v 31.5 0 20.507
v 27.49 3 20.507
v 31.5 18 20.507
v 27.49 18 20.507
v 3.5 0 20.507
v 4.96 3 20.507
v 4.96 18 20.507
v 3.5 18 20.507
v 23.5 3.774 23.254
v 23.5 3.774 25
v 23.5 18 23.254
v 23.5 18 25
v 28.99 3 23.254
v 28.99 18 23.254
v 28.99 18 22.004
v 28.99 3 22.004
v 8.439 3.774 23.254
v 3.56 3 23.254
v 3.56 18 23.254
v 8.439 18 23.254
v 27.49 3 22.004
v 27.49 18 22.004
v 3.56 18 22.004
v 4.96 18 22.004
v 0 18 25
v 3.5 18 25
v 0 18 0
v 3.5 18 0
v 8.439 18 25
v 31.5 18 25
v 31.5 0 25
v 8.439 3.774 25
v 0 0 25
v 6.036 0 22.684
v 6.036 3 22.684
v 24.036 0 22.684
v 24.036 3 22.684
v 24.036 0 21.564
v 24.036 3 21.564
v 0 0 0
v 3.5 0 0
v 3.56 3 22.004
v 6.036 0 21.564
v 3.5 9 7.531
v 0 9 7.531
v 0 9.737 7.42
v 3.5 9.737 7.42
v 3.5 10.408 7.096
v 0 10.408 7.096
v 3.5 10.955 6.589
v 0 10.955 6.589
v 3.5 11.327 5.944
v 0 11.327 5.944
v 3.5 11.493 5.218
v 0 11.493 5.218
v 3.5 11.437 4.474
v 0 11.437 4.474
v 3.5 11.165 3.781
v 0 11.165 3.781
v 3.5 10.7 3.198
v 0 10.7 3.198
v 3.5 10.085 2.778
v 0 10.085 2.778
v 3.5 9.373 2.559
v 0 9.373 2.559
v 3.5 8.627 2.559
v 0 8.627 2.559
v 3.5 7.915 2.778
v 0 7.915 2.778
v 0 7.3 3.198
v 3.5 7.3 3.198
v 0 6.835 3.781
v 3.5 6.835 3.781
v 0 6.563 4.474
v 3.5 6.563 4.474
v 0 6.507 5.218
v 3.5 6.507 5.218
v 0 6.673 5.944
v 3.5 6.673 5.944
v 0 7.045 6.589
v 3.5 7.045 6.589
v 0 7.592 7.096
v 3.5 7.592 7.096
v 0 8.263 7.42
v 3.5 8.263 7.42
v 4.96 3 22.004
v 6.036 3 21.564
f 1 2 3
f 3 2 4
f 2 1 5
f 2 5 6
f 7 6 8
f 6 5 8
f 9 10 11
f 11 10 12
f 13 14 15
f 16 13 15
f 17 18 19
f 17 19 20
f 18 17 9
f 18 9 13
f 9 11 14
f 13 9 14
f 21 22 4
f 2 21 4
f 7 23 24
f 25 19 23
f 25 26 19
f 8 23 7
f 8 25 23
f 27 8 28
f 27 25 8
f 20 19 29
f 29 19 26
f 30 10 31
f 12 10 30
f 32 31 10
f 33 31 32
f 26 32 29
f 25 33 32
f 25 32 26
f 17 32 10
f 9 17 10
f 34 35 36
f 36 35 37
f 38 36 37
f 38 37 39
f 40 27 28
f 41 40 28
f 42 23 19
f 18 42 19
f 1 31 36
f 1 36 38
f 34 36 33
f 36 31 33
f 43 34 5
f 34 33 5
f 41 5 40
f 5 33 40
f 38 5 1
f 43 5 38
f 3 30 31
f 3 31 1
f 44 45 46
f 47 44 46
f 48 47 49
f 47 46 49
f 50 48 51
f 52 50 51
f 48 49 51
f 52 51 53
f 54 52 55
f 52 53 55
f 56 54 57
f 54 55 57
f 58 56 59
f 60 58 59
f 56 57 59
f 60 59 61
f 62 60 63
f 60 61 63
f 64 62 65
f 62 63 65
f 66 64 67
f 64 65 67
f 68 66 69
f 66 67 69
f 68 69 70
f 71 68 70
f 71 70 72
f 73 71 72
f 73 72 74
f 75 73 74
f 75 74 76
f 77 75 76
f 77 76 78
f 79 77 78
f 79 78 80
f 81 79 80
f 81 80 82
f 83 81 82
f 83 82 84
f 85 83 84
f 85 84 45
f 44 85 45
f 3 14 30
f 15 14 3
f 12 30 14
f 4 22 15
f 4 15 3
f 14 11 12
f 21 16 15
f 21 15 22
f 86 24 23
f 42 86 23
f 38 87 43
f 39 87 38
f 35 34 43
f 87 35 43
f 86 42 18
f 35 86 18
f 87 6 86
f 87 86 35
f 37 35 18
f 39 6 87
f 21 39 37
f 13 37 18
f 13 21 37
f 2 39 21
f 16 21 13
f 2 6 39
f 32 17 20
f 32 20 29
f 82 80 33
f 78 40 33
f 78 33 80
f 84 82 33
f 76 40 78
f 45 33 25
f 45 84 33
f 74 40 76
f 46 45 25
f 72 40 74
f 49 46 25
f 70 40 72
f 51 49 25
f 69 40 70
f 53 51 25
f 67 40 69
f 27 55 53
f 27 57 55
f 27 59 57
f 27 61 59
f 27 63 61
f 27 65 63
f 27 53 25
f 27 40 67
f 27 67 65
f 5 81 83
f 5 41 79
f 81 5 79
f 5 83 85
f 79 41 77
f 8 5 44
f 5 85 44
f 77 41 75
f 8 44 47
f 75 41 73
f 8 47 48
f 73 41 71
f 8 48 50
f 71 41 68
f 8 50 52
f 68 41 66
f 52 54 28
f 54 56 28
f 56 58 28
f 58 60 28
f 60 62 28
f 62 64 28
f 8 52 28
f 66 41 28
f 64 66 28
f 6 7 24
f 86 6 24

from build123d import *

# Parameters (mm, degrees)
SKETCH_2_W               = 3.5
SKETCH_2_H               = 18
EXTRUDE_1_DEPTH          = 25
SKETCH_3_W               = 4.492765479
SKETCH_3_H               = 18
EXTRUDE_2_DEPTH          = 28
CUT_EXTRUDE_1_DEPTH      = 15
SKETCH_5_W               = 18
SKETCH_5_H               = 1.12
CUT_EXTRUDE_2_DEPTH      = 4
SKETCH_6_W               = 15.061219586
SKETCH_6_H               = 9.659551438
CUT_EXTRUDE_3_DEPTH      = 26
SKETCH_7_R               = 2.5
CUT_EXTRUDE_4_DEPTH      = 1
CUT_EXTRUDE_4_DEPTH_BACK = 32.5
SKETCH_8_W               = 15.061219586
SKETCH_8_H               = 1.746167636
CUT_EXTRUDE_5_DEPTH      = 5.566914265


with BuildPart() as part:
    # Эскиз2 → Бобышка-Вытянуть1 (new body)
    with BuildSketch(Plane.XY):
        with Locations((1.75, 9)):
            Rectangle(SKETCH_2_W, SKETCH_2_H)
    extrude(amount=EXTRUDE_1_DEPTH)

    # Эскиз3 → Бобышка-Вытянуть2 (add)
    with BuildSketch(Plane(origin=(3.5, 0, 0), x_dir=(0, 0, -1), z_dir=(1, 0, 0))):
        with Locations((-22.753617261, 9)):
            Rectangle(SKETCH_3_W, SKETCH_3_H)
    extrude(amount=EXTRUDE_2_DEPTH)

    # Эскиз4 → Вырез-Вытянуть1 (cut)
    with BuildSketch(Plane(origin=(0, 18, 0), x_dir=(1, 0, 0), z_dir=(0, 1, 0))):
        Polygon((4.95959575, -20.507234521), (4.95959575, -22.003832364), (3.55959575, -22.003832364), (3.55959575, -23.253832364), (28.98959575, -23.253832364), (28.98959575, -22.003832364), (27.48959575, -22.003832364), (27.48959575, -20.507234521), align=None)
    extrude(amount=-CUT_EXTRUDE_1_DEPTH, mode=Mode.SUBTRACT)

    # Эскиз5 → Вырез-Вытянуть2 (cut, through all)
    with BuildSketch(Plane(origin=(0, 3, 0), x_dir=(1, 0, 0), z_dir=(0, 1, 0))):
        with Locations((15.035669989, -22.124024477)):
            Rectangle(SKETCH_5_W, SKETCH_5_H)
    extrude(amount=-CUT_EXTRUDE_2_DEPTH, mode=Mode.SUBTRACT)

    # Эскиз6 → Вырез-Вытянуть3 (cut, through all)
    with BuildSketch(Plane.XY.offset(25)):
        with Locations((15.969390207, 8.603310016)):
            Rectangle(SKETCH_6_W, SKETCH_6_H)
    extrude(amount=-CUT_EXTRUDE_3_DEPTH, mode=Mode.SUBTRACT)

    # Эскиз7 → Вырез-Вытянуть4 (cut, two sides)
    with BuildSketch(Plane.ZY) as cut_extrude_4_sk:
        with Locations((5.030711772, 9)):
            Circle(SKETCH_7_R)
    extrude(amount=CUT_EXTRUDE_4_DEPTH, mode=Mode.SUBTRACT)
    extrude(cut_extrude_4_sk.sketch, amount=-CUT_EXTRUDE_4_DEPTH_BACK, mode=Mode.SUBTRACT)

    # Эскиз8 → Вырез-Вытянуть5 (cut, through all)
    with BuildSketch(Plane.XZ.offset(-13.433085735)):
        with Locations((15.969390207, 24.126916182)):
            Rectangle(SKETCH_8_W, SKETCH_8_H)
    extrude(amount=-CUT_EXTRUDE_5_DEPTH, mode=Mode.SUBTRACT)


solid = part.part
